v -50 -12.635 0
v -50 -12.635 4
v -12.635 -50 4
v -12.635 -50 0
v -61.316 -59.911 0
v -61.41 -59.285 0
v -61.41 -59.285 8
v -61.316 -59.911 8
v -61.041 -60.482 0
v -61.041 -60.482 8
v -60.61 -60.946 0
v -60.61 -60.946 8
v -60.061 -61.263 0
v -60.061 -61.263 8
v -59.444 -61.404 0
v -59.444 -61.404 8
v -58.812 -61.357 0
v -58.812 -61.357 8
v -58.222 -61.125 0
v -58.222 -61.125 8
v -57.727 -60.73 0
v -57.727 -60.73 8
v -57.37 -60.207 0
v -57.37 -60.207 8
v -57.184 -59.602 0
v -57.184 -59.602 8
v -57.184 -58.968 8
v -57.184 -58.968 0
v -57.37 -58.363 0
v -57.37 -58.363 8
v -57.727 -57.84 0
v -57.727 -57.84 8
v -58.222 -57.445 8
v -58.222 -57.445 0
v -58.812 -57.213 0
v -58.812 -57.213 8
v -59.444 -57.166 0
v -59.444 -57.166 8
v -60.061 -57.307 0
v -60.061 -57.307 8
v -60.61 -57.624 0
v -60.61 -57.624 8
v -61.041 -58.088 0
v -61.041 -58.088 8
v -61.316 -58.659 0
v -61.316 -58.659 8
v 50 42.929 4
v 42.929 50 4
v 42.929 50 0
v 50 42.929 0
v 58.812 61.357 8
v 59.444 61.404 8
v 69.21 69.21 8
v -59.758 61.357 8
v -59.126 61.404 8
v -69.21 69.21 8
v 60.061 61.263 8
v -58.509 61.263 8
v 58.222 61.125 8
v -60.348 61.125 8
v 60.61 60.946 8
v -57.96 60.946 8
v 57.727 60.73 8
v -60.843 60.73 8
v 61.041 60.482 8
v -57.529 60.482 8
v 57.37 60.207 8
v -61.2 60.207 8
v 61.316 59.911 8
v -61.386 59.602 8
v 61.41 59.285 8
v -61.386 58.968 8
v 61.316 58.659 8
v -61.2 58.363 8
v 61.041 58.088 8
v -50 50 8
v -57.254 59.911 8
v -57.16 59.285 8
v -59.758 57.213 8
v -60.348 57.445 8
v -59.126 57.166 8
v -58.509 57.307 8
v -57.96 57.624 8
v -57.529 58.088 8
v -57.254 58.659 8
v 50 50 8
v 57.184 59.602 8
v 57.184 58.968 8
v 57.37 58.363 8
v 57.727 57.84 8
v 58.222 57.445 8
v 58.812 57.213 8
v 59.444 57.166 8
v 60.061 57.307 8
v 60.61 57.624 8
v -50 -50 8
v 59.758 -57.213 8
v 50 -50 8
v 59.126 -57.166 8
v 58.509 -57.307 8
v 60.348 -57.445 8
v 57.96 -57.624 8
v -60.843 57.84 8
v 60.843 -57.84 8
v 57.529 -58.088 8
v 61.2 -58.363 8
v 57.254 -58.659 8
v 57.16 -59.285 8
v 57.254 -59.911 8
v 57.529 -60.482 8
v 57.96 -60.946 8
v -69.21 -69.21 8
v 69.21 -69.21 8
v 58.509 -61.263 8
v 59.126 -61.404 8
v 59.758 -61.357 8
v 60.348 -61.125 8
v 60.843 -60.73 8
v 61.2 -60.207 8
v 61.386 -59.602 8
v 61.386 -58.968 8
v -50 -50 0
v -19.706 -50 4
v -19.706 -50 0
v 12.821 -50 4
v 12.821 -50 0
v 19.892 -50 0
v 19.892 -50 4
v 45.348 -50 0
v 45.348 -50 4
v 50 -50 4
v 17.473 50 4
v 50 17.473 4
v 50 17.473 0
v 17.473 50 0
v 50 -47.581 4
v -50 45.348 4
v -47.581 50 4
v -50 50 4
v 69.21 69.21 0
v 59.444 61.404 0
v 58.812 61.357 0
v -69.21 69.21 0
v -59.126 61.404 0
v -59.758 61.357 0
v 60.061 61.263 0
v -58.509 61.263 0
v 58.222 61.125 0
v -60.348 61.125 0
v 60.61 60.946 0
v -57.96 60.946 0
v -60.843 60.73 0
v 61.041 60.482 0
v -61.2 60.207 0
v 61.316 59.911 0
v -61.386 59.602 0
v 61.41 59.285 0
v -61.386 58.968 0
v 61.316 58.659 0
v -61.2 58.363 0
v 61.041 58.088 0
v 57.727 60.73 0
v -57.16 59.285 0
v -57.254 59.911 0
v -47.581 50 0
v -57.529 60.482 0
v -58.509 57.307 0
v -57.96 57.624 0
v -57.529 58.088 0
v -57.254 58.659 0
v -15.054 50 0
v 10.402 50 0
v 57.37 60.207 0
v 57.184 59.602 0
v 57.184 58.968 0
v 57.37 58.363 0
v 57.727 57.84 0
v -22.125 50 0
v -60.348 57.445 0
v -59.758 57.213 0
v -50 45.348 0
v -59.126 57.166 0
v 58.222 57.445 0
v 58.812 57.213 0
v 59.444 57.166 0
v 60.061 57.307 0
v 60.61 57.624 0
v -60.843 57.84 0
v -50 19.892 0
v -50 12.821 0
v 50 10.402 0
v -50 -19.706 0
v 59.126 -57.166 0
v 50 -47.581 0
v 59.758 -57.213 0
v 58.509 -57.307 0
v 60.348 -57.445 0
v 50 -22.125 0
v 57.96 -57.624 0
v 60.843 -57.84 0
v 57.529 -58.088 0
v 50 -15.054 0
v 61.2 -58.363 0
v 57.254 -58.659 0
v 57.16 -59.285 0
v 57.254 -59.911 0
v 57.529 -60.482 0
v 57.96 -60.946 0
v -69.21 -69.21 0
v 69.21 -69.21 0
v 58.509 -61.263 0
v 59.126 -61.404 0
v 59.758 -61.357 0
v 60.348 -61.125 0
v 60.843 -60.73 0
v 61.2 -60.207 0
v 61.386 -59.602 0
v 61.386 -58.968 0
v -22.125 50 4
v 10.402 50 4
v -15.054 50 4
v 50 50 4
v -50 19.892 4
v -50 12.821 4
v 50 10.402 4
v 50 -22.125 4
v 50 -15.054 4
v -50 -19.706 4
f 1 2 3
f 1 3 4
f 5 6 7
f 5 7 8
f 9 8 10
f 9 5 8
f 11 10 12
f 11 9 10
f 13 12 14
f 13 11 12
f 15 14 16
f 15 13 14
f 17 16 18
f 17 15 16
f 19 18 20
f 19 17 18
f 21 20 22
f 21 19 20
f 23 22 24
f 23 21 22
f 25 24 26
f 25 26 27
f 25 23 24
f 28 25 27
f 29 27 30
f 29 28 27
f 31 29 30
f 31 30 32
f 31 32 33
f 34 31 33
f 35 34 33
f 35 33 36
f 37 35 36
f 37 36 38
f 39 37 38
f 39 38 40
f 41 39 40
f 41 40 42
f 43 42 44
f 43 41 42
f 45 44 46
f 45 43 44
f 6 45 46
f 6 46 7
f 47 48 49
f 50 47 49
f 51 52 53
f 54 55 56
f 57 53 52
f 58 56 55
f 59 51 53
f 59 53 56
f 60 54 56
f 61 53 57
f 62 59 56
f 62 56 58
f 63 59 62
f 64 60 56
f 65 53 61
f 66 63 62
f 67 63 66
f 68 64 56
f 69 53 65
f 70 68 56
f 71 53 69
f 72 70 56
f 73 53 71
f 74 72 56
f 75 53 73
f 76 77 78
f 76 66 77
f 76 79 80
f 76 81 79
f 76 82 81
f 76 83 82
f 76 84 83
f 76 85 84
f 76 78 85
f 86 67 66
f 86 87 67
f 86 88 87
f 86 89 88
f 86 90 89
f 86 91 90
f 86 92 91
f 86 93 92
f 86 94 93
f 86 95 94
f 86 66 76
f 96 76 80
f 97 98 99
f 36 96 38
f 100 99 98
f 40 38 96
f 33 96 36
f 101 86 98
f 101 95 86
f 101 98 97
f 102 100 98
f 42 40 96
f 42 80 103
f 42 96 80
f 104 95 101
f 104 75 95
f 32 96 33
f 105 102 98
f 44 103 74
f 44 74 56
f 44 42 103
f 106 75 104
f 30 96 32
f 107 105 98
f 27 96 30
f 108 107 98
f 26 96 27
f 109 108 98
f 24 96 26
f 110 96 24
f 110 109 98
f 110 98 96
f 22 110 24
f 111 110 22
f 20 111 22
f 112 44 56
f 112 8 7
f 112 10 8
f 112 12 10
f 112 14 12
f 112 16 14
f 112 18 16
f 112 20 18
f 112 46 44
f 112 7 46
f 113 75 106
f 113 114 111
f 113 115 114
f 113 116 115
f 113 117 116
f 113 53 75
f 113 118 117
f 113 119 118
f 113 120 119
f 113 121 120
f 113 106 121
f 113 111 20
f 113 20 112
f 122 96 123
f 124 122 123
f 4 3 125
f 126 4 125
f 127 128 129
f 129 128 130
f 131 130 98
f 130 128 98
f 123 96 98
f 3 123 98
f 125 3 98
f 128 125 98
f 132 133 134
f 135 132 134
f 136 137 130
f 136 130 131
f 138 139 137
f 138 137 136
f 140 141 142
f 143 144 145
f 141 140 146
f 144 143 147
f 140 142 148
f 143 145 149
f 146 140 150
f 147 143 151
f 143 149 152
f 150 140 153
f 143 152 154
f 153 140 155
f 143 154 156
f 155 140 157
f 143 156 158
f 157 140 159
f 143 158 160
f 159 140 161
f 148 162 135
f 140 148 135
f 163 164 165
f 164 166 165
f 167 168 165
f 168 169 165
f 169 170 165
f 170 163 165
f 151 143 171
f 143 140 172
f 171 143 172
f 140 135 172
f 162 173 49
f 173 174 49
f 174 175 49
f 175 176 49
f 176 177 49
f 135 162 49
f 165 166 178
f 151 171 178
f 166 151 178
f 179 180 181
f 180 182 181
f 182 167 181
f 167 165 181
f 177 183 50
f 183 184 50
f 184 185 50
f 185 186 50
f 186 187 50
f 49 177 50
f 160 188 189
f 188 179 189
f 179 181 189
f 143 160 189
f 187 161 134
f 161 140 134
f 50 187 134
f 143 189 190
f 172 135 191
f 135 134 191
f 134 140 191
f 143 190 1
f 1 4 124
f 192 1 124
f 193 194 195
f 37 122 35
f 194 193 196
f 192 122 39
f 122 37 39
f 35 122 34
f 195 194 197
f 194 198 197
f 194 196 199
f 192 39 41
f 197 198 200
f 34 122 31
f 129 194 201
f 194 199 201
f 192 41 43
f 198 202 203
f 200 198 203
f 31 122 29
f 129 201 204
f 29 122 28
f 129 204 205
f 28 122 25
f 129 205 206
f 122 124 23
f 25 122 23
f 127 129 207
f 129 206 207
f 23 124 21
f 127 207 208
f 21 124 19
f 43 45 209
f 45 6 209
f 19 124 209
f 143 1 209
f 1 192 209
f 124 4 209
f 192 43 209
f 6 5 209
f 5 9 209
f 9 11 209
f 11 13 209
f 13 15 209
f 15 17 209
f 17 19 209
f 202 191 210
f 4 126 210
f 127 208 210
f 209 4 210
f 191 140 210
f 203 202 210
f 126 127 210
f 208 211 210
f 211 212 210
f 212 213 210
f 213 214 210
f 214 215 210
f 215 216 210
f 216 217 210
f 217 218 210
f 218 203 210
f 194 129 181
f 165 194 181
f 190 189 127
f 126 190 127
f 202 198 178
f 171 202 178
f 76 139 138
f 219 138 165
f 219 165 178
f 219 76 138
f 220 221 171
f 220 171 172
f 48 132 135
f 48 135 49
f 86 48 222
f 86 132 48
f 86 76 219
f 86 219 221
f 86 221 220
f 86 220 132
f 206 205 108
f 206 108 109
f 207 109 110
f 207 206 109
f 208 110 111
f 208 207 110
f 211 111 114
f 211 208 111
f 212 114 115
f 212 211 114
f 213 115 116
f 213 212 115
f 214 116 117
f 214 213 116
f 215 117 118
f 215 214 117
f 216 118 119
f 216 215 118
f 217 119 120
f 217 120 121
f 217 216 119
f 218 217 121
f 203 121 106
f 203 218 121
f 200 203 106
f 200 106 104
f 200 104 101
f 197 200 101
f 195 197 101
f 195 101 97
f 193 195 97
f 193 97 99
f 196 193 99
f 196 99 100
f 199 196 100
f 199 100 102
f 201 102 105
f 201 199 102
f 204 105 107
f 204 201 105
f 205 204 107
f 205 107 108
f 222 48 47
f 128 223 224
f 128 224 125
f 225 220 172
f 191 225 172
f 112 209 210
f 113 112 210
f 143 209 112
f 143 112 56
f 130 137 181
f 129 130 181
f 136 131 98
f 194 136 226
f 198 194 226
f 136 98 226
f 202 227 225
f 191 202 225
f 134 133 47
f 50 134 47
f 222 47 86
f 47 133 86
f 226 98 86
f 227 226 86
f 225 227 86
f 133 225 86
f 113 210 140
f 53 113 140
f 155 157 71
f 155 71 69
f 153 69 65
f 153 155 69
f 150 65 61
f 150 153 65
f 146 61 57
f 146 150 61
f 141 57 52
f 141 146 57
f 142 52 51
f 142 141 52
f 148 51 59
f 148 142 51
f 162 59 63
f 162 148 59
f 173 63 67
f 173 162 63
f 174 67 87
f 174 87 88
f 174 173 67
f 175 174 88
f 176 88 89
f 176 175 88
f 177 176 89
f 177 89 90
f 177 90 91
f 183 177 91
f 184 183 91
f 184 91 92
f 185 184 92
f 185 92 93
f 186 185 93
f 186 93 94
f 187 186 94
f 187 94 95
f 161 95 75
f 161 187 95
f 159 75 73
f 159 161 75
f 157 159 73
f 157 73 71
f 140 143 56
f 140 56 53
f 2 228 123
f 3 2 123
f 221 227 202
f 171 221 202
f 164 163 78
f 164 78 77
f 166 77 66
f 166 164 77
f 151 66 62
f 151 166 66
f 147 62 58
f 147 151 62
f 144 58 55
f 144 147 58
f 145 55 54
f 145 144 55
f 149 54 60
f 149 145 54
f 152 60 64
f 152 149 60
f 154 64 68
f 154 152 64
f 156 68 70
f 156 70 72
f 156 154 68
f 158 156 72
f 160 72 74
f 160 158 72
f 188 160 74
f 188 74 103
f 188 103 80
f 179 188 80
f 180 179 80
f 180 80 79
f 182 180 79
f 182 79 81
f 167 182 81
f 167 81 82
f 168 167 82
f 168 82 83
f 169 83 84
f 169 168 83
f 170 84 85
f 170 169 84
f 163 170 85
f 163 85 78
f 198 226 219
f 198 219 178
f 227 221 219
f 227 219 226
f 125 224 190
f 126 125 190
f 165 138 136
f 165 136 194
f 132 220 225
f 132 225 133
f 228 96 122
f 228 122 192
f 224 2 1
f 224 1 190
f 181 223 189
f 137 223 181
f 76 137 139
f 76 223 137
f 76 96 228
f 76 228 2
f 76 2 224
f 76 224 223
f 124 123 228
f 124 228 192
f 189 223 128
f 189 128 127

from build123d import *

# Parameters (mm, degrees)
SKETCH1_W                        = 138.42
SKETCH1_H                        = 138.42
SKETCH1_R                        = 2.125
BOSS_EXTRUDE1_DEPTH              = 8
SKETCH2_W                        = 100
SKETCH2_H                        = 100
CUT_EXTRUDE10_DEPTH              = 99.204114985
BOSS_EXTRUDE12_REACH             = 100.204
SKETCH12_W                       = 5
SKETCH12_H                       = 8
BOSS_EXTRUDE12_DIRECTION_2_REACH = 100.204
LPATTERN2_COUNT                  = 6
LPATTERN2_PITCH                  = 23
SKETCH2_3_W                      = 100
SKETCH2_3_H                      = 100
CUT_EXTRUDE13_DEPTH              = 4


with BuildPart() as part:
    # Sketch1 → Boss-Extrude1 (new body)
    with BuildSketch(Plane.XY):
        Rectangle(SKETCH1_W, SKETCH1_H)
        with Locations((-59.285, 59.285)):
            Circle(SKETCH1_R, mode=Mode.SUBTRACT)
        with Locations(Location((59.285, -59.285, 0), (0, 0, 180))):
            Circle(SKETCH1_R, mode=Mode.SUBTRACT)
        with Locations((59.285, 59.285)):
            Circle(SKETCH1_R, mode=Mode.SUBTRACT)
        with Locations(Location((-59.285, -59.285, 0), (0, 0, 180))):
            Circle(SKETCH1_R, mode=Mode.SUBTRACT)
    extrude(amount=BOSS_EXTRUDE1_DEPTH)

    # Sketch2 → Cut-Extrude10 (cut, through all)
    with BuildSketch(Plane.XY.offset(8)):
        Rectangle(SKETCH2_W, SKETCH2_H)
    extrude(amount=-CUT_EXTRUDE10_DEPTH, mode=Mode.SUBTRACT)

    # Sketch12 → Boss-Extrude12 (add, up to next)
    with BuildSketch(Plane(origin=(0, 0, 0), x_dir=(-0.7071067811865477, -0.7071067811865475, 0), z_dir=(0.7071067811865475, -0.7071067811865477, 0)), mode=Mode.PRIVATE) as boss_extrude12_sk1:
        with Locations((-68.210678119, -4)):
            Rectangle(SKETCH12_W, SKETCH12_H)
    boss_extrude12_tool1 = extrude(boss_extrude12_sk1.sketch, amount=BOSS_EXTRUDE12_REACH, mode=Mode.PRIVATE) - part.part
    boss_extrude12 = boss_extrude12_tool1.solids().sort_by_distance((48.232233, 48.232233, 4))[0]
    add(boss_extrude12)

    # Sketch12 → Boss-Extrude12 direction 2 (add, up to next)
    with BuildSketch(Plane(origin=(0, 0, 0), x_dir=(-0.7071067811865477, -0.7071067811865475, 0), z_dir=(0.7071067811865475, -0.7071067811865477, 0)), mode=Mode.PRIVATE) as boss_extrude12_direction_2_sk1:
        with Locations((-68.210678119, -4)):
            Rectangle(SKETCH12_W, SKETCH12_H)
    boss_extrude12_direction_2_tool1 = extrude(boss_extrude12_direction_2_sk1.sketch, amount=-BOSS_EXTRUDE12_DIRECTION_2_REACH, mode=Mode.PRIVATE) - part.part
    boss_extrude12_direction_2 = boss_extrude12_direction_2_tool1.solids().sort_by_distance((48.232233, 48.232233, 4))[0]
    add(boss_extrude12_direction_2)

    # LPattern2: Boss-Extrude12, Boss-Extrude12 direction 2; each copy of Boss-Extrude12, Boss-Extrude12 direction 2 runs up to whatever stops it at its own place
    lpattern2_before = part.part  # the part as the pattern finds it: every copy runs up to it
    lpattern2_boss_extrude12_long = extrude(boss_extrude12_sk1.sketch, amount=BOSS_EXTRUDE12_REACH, mode=Mode.PRIVATE)
    lpattern2_boss_extrude12_tool1 = lpattern2_boss_extrude12_long.moved(Location(Vector(-0.7071067811865477, -0.7071067811865475, 0) * (1 * LPATTERN2_PITCH))) - lpattern2_before
    add(lpattern2_boss_extrude12_tool1.solids().sort_by_distance((31.968777, 31.968777, 4))[0])
    lpattern2_boss_extrude12_tool2 = lpattern2_boss_extrude12_long.moved(Location(Vector(-0.7071067811865477, -0.7071067811865475, 0) * (2 * LPATTERN2_PITCH))) - lpattern2_before
    add(lpattern2_boss_extrude12_tool2.solids().sort_by_distance((15.705321, 15.705321, 4))[0])
    lpattern2_boss_extrude12_tool3 = lpattern2_boss_extrude12_long.moved(Location(Vector(-0.7071067811865477, -0.7071067811865475, 0) * (3 * LPATTERN2_PITCH))) - lpattern2_before
    add(lpattern2_boss_extrude12_tool3.solids().sort_by_distance((-0.558135, -0.558135, 4))[0])
    lpattern2_boss_extrude12_tool4 = lpattern2_boss_extrude12_long.moved(Location(Vector(-0.7071067811865477, -0.7071067811865475, 0) * (4 * LPATTERN2_PITCH))) - lpattern2_before
    add(lpattern2_boss_extrude12_tool4.solids().sort_by_distance((-16.821591, -16.821591, 4))[0])
    lpattern2_boss_extrude12_tool5 = lpattern2_boss_extrude12_long.moved(Location(Vector(-0.7071067811865477, -0.7071067811865475, 0) * (5 * LPATTERN2_PITCH))) - lpattern2_before
    add(lpattern2_boss_extrude12_tool5.solids().sort_by_distance((-33.085047, -33.085047, 4))[0])
    lpattern2_boss_extrude12_direction_2_long = extrude(boss_extrude12_direction_2_sk1.sketch, amount=-BOSS_EXTRUDE12_DIRECTION_2_REACH, mode=Mode.PRIVATE)
    lpattern2_boss_extrude12_direction_2_tool1 = lpattern2_boss_extrude12_direction_2_long.moved(Location(Vector(-0.7071067811865477, -0.7071067811865475, 0) * (1 * LPATTERN2_PITCH))) - lpattern2_before
    add(lpattern2_boss_extrude12_direction_2_tool1.solids().sort_by_distance((31.968777, 31.968777, 4))[0])
    lpattern2_boss_extrude12_direction_2_tool2 = lpattern2_boss_extrude12_direction_2_long.moved(Location(Vector(-0.7071067811865477, -0.7071067811865475, 0) * (2 * LPATTERN2_PITCH))) - lpattern2_before
    add(lpattern2_boss_extrude12_direction_2_tool2.solids().sort_by_distance((15.705321, 15.705321, 4))[0])
    lpattern2_boss_extrude12_direction_2_tool3 = lpattern2_boss_extrude12_direction_2_long.moved(Location(Vector(-0.7071067811865477, -0.7071067811865475, 0) * (3 * LPATTERN2_PITCH))) - lpattern2_before
    add(lpattern2_boss_extrude12_direction_2_tool3.solids().sort_by_distance((-0.558135, -0.558135, 4))[0])
    lpattern2_boss_extrude12_direction_2_tool4 = lpattern2_boss_extrude12_direction_2_long.moved(Location(Vector(-0.7071067811865477, -0.7071067811865475, 0) * (4 * LPATTERN2_PITCH))) - lpattern2_before
    add(lpattern2_boss_extrude12_direction_2_tool4.solids().sort_by_distance((-16.821591, -16.821591, 4))[0])
    lpattern2_boss_extrude12_direction_2_tool5 = lpattern2_boss_extrude12_direction_2_long.moved(Location(Vector(-0.7071067811865477, -0.7071067811865475, 0) * (5 * LPATTERN2_PITCH))) - lpattern2_before
    add(lpattern2_boss_extrude12_direction_2_tool5.solids().sort_by_distance((-33.085047, -33.085047, 4))[0])

    # Sketch2<3> → Cut-Extrude13 (cut)
    with BuildSketch(Plane.XY.offset(8)):
        Rectangle(SKETCH2_3_W, SKETCH2_3_H)
    extrude(amount=-CUT_EXTRUDE13_DEPTH, mode=Mode.SUBTRACT)


solid = part.part
